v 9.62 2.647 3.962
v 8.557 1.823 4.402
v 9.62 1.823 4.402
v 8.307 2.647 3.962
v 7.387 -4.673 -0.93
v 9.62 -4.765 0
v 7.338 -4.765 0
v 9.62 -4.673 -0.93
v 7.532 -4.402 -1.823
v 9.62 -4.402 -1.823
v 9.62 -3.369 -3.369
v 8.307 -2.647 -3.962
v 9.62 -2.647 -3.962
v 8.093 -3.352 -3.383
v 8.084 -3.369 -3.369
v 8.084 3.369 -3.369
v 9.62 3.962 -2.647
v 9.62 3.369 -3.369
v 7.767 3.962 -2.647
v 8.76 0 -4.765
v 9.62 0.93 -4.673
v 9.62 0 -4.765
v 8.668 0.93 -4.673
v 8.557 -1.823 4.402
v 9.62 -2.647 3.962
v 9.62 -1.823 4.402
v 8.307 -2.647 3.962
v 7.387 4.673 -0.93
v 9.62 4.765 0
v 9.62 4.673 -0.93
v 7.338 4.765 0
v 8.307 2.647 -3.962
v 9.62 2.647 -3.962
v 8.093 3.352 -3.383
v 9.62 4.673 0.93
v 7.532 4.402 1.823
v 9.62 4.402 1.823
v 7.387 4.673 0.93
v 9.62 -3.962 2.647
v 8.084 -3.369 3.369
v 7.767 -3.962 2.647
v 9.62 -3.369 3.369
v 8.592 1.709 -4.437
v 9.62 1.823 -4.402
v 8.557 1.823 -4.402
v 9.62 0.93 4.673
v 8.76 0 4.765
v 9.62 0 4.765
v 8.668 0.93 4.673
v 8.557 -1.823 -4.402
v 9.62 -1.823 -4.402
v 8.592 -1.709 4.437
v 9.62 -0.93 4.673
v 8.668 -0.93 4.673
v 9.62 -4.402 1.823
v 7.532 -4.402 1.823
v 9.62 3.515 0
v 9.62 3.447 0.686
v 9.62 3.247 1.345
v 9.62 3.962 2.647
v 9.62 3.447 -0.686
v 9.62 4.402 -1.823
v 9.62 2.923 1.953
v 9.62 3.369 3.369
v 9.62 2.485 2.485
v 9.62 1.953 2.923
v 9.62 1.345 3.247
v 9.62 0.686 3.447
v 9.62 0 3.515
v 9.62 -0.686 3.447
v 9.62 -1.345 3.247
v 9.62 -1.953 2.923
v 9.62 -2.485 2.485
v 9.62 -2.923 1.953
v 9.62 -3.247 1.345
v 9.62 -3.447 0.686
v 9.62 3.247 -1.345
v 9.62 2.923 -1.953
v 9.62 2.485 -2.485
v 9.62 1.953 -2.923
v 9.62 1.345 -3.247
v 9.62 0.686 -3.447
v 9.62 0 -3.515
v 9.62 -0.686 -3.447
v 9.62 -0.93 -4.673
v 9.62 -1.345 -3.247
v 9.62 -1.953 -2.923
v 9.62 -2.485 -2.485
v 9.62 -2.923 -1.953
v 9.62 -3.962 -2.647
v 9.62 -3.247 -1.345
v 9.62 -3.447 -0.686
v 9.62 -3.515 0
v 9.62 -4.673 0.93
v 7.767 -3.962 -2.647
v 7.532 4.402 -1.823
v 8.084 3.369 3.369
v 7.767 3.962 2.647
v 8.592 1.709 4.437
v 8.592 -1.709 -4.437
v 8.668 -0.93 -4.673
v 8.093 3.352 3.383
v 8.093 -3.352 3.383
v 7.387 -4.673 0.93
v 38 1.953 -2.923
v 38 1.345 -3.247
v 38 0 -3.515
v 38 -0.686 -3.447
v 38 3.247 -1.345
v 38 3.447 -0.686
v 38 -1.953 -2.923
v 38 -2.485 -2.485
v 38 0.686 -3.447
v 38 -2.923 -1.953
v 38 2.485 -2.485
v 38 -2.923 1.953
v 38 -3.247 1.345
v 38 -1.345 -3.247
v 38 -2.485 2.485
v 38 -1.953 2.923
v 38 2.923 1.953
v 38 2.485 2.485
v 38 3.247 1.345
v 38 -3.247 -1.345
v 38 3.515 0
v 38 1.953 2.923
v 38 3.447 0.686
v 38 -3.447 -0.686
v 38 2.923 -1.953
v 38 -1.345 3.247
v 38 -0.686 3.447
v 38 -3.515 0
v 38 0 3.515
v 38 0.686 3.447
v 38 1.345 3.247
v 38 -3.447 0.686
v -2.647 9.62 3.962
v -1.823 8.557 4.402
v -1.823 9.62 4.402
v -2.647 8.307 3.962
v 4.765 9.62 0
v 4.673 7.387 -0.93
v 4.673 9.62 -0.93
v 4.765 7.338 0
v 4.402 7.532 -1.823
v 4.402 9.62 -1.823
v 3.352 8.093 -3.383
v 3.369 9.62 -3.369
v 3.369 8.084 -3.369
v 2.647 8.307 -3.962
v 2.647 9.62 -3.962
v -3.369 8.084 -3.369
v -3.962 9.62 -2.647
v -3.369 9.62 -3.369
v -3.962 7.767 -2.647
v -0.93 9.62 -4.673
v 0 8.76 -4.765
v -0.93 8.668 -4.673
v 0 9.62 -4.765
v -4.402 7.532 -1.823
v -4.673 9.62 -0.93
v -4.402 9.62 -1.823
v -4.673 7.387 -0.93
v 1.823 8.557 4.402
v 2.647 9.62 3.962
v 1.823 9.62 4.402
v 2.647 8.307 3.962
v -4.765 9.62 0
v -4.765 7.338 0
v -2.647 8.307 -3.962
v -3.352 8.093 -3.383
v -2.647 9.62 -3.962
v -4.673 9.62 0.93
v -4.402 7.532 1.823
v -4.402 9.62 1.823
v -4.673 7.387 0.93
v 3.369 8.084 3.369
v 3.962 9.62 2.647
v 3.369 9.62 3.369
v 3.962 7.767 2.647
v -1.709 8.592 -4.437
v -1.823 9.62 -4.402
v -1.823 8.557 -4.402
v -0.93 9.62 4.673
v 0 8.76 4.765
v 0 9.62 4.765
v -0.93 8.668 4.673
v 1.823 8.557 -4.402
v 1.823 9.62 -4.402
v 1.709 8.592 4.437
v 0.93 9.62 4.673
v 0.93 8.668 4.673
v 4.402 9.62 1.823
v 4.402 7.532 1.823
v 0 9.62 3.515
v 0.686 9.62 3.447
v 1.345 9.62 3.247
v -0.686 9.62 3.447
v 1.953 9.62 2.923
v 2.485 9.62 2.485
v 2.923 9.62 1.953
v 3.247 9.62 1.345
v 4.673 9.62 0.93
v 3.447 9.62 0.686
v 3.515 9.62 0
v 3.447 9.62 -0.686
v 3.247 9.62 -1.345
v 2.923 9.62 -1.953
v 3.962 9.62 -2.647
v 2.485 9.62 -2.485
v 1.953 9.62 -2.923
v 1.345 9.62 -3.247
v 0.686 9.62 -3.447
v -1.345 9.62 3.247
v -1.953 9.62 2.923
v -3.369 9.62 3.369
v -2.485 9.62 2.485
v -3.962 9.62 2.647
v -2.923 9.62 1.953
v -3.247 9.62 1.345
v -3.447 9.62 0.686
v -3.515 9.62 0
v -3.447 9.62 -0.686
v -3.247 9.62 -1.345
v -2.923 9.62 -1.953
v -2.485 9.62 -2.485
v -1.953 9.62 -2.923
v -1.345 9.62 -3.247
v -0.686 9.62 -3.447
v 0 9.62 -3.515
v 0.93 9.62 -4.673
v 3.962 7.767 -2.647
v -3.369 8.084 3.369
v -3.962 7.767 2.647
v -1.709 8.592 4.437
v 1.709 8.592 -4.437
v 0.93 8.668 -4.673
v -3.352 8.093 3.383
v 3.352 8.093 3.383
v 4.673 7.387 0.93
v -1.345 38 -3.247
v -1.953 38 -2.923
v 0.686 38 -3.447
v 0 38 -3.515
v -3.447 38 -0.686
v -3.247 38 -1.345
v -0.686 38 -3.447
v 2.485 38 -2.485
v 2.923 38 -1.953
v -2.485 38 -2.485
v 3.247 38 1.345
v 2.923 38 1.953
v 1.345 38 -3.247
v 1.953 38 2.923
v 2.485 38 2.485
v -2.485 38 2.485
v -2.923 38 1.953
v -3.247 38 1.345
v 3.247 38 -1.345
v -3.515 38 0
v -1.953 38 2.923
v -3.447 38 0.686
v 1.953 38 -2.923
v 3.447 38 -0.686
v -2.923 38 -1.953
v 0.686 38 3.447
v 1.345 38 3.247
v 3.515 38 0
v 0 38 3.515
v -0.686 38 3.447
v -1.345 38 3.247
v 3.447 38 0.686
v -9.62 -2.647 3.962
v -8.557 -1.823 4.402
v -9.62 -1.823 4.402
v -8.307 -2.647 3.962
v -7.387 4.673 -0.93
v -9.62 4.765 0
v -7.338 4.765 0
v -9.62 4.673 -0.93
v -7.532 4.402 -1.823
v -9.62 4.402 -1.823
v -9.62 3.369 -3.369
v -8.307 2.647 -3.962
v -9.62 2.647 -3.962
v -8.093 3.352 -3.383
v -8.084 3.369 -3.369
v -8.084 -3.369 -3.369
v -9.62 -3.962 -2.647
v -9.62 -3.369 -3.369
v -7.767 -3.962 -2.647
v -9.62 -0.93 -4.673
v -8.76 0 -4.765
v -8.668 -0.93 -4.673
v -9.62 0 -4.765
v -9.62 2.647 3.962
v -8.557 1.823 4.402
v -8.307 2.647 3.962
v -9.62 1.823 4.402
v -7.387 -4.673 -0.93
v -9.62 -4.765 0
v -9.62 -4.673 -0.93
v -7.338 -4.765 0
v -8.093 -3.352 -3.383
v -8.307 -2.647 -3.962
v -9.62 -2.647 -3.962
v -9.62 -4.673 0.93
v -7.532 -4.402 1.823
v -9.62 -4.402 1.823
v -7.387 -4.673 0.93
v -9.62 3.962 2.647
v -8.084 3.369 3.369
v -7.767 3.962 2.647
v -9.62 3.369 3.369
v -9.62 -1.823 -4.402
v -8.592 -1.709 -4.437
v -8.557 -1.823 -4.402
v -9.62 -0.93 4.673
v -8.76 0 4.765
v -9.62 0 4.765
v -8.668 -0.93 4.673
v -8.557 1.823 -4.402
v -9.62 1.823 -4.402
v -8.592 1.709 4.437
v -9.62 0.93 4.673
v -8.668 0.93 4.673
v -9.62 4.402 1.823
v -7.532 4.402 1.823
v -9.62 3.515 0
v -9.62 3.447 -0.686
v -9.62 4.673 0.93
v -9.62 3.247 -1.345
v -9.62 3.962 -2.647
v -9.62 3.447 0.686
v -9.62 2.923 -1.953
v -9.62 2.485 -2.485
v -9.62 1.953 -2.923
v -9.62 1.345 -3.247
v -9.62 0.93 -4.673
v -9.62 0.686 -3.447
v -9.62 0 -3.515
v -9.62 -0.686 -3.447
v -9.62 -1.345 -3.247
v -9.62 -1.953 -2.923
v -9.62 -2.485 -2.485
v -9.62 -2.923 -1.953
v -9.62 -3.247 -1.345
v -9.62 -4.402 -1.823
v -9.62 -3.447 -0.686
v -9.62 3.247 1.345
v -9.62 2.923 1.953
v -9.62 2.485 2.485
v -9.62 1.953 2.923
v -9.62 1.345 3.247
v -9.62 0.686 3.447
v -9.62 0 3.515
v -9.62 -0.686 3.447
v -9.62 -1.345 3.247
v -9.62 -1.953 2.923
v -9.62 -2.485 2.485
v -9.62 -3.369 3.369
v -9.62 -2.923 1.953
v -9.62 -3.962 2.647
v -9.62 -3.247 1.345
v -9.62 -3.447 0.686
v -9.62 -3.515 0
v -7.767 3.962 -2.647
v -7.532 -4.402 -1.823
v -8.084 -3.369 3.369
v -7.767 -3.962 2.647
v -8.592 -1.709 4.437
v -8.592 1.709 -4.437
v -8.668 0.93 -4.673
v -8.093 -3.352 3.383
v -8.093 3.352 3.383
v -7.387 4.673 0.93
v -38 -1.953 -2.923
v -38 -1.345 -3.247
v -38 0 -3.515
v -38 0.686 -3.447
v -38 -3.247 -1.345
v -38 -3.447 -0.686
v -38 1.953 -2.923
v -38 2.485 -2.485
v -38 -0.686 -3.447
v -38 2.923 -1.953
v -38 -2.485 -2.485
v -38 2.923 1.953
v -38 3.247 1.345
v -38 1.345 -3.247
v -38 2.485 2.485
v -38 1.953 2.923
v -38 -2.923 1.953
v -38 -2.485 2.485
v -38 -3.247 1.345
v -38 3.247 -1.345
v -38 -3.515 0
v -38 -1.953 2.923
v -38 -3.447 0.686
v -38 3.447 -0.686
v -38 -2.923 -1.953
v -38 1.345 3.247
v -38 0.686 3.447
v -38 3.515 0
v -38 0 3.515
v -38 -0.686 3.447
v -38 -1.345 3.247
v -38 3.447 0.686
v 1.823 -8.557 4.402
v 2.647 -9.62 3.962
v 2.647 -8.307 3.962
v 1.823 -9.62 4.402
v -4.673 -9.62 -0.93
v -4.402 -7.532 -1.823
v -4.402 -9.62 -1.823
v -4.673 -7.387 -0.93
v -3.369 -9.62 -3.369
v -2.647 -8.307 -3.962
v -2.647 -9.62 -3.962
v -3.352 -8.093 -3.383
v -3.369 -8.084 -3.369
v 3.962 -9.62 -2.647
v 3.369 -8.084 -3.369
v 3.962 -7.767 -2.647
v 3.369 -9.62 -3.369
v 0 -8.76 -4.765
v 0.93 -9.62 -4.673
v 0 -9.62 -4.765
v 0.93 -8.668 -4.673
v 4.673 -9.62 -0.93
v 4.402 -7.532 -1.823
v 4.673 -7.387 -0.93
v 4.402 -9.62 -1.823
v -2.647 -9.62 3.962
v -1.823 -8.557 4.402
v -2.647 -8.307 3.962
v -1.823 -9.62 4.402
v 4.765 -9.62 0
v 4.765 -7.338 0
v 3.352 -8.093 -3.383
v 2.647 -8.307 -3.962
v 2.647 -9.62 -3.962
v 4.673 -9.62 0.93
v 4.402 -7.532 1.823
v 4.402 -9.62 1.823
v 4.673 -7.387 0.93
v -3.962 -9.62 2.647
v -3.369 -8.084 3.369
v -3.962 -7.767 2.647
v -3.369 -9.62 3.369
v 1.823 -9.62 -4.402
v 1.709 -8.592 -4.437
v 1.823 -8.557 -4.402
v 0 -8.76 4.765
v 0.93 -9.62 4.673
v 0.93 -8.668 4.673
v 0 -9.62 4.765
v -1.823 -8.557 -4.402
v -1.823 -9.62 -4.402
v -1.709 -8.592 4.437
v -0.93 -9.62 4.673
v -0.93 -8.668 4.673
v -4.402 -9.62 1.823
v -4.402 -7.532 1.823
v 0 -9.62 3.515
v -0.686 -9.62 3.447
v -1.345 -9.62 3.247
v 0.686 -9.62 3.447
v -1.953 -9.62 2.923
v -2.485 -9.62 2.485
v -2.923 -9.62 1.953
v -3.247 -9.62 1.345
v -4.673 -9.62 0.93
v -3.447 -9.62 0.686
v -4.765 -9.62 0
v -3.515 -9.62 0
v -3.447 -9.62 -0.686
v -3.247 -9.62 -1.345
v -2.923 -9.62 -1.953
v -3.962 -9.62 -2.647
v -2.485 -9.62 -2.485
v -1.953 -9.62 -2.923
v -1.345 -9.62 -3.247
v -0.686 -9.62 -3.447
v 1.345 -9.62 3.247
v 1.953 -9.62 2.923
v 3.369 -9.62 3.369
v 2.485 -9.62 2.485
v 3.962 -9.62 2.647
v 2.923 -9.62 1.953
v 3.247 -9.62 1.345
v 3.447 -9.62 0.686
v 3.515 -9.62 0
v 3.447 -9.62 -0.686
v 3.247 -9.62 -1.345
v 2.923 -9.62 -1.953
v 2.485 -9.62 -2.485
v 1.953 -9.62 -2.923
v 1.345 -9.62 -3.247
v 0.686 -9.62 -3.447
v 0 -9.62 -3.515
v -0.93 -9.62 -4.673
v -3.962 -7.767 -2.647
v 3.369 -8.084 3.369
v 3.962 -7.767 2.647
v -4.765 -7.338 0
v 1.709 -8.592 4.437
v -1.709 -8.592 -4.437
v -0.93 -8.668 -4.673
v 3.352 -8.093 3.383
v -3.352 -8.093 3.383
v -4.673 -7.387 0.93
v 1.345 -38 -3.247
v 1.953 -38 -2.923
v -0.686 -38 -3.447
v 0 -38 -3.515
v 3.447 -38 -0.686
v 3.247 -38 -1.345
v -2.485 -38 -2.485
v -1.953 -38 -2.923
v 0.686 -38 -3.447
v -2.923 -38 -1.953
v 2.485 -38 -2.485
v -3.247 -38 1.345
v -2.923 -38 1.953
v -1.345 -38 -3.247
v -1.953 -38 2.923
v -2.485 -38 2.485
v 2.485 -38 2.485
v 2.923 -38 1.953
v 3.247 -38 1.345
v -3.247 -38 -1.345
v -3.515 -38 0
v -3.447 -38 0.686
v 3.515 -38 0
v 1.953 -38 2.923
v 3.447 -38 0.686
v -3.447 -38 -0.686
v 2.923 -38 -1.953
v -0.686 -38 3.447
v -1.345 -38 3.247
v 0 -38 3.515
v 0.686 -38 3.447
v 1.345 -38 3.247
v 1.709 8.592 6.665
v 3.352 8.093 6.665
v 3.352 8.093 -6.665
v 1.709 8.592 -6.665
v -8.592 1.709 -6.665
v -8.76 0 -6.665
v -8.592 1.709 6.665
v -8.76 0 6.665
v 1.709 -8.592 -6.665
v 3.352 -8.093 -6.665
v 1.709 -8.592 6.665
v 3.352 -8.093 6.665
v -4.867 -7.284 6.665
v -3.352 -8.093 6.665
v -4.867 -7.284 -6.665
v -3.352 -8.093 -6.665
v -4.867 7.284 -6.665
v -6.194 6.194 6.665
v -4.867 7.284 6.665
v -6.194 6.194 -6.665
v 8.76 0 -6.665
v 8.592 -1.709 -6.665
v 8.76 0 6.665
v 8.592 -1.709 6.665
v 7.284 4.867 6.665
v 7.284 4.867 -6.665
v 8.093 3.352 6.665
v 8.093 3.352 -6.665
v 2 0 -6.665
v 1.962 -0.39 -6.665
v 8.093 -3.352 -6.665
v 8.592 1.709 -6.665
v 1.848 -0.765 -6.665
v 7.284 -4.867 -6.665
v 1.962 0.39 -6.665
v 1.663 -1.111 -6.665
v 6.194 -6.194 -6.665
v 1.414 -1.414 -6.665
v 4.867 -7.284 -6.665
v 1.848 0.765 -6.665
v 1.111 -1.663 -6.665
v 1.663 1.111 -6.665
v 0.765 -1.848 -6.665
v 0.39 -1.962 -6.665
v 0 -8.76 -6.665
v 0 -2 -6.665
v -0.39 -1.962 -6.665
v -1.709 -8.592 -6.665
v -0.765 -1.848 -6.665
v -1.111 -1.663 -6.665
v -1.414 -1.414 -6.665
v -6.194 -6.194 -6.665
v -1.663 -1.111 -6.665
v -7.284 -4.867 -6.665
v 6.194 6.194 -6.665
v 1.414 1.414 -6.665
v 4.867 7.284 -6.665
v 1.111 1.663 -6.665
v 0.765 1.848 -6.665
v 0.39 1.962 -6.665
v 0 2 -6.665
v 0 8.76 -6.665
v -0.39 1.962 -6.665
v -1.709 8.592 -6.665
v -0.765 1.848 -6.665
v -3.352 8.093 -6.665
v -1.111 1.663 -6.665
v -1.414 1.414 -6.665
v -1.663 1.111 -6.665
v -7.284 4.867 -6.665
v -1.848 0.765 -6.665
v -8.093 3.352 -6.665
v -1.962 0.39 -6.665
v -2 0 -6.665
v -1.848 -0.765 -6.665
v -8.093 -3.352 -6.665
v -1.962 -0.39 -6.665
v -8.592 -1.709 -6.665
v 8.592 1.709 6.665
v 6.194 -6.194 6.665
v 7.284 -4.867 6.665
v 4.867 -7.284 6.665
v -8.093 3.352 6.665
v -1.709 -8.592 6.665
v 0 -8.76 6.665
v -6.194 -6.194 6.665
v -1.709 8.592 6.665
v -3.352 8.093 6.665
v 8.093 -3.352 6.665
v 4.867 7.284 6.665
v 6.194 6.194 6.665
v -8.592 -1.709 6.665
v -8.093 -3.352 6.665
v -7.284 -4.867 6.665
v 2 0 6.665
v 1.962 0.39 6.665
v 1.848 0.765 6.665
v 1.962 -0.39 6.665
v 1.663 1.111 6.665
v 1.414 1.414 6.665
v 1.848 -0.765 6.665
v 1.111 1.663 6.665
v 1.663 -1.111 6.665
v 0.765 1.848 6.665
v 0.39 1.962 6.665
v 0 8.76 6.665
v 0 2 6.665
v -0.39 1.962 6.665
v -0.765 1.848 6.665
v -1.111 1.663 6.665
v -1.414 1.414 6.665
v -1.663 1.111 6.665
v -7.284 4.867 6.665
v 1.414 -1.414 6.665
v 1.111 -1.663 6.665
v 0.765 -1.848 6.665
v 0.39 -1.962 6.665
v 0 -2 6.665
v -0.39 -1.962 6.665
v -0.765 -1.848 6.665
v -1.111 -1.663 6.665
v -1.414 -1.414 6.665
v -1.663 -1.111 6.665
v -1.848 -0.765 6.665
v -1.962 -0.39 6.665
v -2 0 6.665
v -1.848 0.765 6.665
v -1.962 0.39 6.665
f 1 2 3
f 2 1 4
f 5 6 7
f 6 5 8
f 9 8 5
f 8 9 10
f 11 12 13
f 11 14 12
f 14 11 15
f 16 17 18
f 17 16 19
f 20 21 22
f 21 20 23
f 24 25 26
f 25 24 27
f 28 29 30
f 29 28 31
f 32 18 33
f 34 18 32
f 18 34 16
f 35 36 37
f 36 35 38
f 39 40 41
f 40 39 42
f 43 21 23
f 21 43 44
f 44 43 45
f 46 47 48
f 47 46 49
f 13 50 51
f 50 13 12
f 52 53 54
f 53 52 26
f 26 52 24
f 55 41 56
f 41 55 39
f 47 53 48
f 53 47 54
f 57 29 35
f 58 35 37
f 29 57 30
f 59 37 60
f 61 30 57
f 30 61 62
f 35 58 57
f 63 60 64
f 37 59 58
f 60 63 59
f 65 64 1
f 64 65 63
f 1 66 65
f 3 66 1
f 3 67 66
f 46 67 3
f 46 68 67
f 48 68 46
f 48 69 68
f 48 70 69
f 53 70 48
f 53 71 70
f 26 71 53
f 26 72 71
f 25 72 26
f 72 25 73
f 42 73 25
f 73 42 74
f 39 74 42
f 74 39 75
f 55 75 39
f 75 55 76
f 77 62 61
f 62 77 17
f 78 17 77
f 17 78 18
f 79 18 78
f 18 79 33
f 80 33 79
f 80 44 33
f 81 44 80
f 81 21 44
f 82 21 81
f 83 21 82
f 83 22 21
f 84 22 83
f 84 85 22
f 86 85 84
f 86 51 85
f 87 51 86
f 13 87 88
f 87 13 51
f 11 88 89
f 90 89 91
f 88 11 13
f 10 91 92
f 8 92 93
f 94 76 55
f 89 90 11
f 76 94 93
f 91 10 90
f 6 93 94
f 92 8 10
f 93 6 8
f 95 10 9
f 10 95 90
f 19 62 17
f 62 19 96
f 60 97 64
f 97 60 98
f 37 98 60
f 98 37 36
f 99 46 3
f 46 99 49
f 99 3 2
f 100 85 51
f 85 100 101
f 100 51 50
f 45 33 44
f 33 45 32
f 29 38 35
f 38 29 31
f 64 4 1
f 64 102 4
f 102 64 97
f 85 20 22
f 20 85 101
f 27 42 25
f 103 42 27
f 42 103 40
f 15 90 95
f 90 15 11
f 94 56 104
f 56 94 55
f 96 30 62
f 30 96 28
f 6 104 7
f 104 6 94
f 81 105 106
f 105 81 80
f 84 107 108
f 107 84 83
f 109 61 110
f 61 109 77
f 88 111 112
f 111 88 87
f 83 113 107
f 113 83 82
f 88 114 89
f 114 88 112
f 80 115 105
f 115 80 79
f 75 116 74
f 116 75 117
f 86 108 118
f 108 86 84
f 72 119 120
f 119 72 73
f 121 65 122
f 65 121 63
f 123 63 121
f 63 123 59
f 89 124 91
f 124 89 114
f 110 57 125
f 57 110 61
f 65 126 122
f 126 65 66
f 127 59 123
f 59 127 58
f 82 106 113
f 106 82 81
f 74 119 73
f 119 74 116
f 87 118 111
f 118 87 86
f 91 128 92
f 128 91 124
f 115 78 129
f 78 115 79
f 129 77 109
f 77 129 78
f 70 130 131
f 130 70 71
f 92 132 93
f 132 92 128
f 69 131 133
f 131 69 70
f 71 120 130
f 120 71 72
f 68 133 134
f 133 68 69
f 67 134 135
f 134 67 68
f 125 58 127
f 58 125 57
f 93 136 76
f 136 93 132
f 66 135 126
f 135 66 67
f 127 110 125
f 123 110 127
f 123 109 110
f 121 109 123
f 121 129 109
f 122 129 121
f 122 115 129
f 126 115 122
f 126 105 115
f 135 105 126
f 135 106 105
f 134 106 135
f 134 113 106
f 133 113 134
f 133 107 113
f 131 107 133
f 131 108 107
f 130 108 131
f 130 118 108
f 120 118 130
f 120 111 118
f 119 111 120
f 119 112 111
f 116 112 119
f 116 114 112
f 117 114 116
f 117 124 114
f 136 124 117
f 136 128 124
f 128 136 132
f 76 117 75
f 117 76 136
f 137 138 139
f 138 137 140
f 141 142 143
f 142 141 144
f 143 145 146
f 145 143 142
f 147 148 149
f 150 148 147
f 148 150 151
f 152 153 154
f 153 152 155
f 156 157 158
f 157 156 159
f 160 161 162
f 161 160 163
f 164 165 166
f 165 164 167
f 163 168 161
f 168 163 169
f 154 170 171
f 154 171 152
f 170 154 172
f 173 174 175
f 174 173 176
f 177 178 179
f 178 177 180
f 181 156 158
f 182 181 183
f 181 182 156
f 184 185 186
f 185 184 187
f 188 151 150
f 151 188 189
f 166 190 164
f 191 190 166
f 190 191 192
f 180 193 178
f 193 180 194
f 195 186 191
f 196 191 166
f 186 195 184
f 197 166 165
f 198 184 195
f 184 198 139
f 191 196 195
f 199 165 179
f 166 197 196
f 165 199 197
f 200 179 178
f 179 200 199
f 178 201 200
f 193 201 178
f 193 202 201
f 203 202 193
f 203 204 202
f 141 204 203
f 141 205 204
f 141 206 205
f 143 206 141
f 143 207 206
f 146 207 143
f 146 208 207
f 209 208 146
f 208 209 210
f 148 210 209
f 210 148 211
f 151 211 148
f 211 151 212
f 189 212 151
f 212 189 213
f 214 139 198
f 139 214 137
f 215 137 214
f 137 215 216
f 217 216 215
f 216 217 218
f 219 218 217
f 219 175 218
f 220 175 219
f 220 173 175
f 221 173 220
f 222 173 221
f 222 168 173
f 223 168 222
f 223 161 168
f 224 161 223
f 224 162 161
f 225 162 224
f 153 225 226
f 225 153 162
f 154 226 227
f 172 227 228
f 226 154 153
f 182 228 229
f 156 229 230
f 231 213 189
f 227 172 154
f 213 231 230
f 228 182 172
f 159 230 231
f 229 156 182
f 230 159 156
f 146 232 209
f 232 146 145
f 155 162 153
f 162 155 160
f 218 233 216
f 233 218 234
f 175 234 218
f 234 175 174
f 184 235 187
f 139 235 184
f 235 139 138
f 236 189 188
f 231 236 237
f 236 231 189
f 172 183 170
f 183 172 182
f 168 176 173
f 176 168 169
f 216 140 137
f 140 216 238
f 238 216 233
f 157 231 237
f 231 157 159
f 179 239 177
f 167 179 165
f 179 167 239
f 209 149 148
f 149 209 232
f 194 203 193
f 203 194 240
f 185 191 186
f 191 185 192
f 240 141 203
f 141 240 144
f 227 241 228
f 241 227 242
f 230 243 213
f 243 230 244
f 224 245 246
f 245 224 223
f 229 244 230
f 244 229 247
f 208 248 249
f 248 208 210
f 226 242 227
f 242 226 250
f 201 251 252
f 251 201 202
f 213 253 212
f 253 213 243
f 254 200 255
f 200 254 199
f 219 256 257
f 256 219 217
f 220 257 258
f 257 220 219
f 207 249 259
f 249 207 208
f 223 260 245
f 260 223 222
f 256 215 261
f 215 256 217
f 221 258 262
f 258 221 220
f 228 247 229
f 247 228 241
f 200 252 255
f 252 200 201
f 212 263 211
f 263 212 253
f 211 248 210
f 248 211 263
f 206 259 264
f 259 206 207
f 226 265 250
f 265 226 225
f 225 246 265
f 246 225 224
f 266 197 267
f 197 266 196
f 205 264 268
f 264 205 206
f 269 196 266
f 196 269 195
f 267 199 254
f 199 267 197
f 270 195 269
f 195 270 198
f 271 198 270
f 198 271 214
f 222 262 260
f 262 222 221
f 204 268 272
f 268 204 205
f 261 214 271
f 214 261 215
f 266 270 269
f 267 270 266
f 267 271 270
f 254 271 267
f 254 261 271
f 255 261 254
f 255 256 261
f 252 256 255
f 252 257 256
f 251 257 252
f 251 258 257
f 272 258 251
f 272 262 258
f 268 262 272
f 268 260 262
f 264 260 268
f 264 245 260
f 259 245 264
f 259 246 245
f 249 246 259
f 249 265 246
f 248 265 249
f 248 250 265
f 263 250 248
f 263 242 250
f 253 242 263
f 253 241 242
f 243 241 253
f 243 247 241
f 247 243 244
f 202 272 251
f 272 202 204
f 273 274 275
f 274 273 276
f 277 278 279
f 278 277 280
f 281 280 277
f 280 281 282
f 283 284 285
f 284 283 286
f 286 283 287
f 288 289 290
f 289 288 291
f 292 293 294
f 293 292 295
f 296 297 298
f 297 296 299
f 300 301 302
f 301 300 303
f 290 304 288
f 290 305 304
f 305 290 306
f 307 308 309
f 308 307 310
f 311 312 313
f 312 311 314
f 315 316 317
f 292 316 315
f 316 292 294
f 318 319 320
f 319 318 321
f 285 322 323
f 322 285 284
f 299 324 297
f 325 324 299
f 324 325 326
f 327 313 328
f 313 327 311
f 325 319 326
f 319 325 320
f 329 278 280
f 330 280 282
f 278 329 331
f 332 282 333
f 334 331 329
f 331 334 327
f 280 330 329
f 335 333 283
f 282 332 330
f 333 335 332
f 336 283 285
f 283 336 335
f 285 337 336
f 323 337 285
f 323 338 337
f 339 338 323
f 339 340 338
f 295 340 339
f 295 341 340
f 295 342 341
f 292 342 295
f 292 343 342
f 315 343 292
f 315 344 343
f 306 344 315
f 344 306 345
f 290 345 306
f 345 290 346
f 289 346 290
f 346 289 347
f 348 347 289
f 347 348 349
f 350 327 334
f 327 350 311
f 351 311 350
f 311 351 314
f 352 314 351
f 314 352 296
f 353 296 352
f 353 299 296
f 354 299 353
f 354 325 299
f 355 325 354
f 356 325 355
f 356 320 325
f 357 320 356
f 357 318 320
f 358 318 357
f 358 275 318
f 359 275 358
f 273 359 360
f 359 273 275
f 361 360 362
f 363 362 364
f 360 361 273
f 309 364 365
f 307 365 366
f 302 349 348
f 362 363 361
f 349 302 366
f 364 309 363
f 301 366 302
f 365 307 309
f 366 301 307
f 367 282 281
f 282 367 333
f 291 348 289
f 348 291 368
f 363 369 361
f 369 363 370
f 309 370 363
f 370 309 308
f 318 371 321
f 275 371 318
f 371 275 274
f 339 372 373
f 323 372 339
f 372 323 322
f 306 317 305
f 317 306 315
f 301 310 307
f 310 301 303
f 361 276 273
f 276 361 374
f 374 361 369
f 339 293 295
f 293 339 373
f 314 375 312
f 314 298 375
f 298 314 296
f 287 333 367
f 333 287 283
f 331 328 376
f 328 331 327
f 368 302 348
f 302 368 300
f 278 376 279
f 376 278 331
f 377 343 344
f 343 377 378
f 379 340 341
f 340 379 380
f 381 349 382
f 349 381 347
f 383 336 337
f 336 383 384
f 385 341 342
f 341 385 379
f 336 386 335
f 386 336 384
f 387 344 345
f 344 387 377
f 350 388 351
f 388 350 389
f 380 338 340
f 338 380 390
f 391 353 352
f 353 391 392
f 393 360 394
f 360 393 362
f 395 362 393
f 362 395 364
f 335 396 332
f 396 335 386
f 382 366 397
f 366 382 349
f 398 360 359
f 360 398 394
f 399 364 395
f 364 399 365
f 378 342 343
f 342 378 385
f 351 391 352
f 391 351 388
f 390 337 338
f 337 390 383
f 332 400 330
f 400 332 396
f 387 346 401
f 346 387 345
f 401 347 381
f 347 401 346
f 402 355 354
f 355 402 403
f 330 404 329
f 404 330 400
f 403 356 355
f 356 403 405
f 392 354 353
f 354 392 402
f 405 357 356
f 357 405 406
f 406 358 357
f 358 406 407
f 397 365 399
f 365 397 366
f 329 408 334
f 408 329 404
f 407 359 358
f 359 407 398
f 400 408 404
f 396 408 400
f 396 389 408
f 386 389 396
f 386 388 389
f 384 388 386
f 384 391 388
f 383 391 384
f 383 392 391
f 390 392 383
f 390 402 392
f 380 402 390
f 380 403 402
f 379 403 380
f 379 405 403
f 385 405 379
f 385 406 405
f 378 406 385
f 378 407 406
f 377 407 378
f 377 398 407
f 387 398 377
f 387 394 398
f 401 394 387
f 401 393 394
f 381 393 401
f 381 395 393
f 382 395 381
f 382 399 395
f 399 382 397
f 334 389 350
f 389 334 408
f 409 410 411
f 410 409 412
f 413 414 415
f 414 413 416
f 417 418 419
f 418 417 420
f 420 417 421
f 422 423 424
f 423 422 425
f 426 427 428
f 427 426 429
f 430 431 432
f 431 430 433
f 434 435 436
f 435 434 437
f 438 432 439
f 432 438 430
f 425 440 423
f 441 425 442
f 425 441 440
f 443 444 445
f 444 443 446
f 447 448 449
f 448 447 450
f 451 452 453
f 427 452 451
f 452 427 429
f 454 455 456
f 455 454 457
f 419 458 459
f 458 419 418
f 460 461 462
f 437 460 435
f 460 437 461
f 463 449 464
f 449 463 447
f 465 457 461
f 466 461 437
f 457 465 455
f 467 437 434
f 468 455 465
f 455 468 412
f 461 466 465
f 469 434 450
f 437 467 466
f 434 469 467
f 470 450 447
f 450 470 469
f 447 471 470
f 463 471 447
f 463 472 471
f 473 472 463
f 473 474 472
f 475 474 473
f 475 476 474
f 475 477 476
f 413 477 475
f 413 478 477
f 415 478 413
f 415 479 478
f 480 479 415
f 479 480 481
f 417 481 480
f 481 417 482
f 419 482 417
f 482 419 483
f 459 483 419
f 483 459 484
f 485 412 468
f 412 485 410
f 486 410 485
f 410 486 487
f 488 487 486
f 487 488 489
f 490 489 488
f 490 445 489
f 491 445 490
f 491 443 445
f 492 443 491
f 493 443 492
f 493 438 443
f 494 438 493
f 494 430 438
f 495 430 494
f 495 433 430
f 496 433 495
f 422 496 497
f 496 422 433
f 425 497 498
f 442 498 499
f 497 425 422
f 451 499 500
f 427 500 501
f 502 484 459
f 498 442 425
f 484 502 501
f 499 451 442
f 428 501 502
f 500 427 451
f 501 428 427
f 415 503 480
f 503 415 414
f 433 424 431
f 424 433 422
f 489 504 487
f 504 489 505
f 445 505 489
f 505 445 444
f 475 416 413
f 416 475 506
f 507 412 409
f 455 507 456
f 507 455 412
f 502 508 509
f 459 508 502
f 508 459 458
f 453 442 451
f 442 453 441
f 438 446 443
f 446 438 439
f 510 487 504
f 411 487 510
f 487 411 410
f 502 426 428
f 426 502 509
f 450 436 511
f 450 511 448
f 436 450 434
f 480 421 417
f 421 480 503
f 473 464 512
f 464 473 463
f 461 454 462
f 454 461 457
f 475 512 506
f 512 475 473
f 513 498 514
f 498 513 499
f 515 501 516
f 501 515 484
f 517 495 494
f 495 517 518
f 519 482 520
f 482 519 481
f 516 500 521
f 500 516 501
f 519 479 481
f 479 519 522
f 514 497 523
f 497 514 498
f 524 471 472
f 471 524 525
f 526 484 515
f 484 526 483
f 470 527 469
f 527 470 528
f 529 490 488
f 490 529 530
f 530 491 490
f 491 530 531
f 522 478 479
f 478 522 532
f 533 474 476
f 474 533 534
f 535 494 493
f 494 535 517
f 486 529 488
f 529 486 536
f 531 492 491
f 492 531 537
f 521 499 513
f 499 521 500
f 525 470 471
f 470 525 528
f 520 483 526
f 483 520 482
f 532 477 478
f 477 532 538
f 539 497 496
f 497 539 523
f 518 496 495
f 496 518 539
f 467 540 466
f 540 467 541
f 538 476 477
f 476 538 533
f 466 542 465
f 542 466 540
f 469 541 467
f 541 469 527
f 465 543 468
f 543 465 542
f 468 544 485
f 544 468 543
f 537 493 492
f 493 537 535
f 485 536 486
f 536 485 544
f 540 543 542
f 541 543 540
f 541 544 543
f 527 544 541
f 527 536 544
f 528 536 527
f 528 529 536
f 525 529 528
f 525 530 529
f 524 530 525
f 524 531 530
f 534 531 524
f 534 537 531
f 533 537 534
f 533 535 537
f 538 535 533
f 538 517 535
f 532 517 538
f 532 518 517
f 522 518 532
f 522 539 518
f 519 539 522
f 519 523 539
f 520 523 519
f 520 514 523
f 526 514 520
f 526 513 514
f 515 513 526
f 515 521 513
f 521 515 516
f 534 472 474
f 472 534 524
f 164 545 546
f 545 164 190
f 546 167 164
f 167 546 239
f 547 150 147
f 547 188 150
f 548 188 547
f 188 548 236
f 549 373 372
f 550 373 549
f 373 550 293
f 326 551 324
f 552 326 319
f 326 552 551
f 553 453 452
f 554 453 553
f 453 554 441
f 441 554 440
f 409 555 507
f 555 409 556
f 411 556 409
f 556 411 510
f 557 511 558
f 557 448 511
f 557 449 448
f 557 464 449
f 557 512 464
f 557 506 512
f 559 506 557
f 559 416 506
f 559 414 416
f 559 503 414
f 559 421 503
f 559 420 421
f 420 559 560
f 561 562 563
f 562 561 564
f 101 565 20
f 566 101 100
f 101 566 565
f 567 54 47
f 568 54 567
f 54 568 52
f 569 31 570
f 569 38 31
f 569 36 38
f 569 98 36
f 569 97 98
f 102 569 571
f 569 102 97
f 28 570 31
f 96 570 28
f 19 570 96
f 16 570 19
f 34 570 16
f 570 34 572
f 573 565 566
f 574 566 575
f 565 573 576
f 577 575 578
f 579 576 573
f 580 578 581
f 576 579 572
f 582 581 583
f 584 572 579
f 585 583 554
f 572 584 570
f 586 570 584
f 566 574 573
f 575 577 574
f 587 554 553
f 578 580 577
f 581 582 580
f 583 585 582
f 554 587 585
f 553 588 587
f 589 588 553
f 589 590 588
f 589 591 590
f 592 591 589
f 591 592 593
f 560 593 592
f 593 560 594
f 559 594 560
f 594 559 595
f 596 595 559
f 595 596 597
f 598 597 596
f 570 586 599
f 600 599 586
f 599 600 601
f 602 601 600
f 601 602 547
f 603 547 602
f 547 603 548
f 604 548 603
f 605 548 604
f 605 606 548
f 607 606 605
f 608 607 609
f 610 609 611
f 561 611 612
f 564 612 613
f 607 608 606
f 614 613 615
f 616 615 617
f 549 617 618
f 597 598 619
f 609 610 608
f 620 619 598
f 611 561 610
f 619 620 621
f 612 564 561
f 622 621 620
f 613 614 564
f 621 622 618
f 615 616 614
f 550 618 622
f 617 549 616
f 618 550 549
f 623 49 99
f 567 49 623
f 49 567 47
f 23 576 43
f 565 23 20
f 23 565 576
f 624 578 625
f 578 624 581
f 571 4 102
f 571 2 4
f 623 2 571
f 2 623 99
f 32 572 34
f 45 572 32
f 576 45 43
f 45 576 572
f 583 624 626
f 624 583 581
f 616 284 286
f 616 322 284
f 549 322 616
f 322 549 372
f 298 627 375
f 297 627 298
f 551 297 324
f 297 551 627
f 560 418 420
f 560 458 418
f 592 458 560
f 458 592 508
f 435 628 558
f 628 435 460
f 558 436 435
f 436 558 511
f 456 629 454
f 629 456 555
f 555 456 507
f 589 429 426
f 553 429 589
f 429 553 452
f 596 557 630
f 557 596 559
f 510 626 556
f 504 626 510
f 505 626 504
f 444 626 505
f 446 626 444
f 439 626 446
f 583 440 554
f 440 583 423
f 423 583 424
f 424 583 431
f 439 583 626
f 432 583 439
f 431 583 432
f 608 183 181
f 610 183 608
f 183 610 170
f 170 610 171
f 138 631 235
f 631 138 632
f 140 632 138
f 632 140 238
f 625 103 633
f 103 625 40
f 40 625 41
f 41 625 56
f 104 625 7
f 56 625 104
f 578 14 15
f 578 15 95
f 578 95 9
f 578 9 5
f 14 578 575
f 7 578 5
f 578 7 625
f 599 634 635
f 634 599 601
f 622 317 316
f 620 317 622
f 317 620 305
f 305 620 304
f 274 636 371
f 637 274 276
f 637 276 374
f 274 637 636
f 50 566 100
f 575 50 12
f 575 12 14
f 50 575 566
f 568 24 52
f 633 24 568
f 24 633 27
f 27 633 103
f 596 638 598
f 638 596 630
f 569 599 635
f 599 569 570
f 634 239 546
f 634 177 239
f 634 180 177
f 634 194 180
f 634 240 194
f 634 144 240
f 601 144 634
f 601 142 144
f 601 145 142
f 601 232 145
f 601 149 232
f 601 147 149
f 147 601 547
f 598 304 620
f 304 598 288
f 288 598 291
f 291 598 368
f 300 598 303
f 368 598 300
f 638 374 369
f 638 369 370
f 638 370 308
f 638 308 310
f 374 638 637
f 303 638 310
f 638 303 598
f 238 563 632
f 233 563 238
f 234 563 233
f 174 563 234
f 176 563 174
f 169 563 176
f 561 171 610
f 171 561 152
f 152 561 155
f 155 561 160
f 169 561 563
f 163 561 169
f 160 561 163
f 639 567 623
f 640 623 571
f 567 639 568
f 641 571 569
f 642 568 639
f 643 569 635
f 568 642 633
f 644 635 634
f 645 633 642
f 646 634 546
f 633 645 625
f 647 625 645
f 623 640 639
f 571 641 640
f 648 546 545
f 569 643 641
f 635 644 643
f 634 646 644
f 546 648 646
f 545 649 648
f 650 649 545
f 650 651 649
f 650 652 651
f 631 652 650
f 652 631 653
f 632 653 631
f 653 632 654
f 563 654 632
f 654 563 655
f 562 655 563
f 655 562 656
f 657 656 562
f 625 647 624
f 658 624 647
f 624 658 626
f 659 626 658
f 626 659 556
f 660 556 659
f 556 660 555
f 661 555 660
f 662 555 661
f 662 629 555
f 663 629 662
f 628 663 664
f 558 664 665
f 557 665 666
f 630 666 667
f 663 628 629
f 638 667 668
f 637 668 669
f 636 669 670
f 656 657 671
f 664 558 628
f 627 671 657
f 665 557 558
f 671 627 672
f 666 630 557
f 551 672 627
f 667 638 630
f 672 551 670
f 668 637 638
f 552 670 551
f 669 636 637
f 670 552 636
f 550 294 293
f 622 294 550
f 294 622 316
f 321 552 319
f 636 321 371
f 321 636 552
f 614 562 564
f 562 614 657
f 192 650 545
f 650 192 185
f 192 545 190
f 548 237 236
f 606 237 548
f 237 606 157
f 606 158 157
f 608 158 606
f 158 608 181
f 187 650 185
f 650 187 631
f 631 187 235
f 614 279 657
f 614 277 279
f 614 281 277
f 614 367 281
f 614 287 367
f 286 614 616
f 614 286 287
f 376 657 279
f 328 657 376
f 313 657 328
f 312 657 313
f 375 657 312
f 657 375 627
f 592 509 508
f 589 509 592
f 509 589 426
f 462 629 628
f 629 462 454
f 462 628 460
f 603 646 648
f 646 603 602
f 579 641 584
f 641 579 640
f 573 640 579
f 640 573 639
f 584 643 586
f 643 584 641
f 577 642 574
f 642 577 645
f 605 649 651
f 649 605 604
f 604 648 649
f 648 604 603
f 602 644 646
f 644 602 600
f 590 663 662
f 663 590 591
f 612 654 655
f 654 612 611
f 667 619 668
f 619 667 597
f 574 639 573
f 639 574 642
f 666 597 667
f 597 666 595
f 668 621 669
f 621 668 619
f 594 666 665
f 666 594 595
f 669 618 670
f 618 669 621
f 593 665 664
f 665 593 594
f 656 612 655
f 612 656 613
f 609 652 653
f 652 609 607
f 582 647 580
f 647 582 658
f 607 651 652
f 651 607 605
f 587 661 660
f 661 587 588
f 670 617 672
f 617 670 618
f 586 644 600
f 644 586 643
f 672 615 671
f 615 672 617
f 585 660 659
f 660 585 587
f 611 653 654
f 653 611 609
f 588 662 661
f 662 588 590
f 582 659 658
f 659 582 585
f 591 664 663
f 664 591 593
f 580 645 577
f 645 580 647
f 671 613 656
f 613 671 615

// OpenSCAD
$fn = 32;

// ----------------------------------------------------------------------
// Cardan cross: 76 mm span, 9.53 mm trunnions
// ----------------------------------------------------------------------

// --- parameters (mm) ---
journal_d = 9.53;         // trunnion diameter
arm_len = 38;             // trunnion length from the centre
step_r = 3.24;            // step position from the centre
step_d = 7.03;            // journal diameter after the step
hub_d = 17.52;            // hub diameter
hub_h = 13.33;            // hub height
bore_d = 4;               // hub bore

difference() {
  union() {
    /* hub along the joint axis */
    cylinder(h = hub_h, d = hub_d, center = true);
    for (a = [0 : 90 : 270]) rotate([0, 0, a]) {
      /* trunnion, sunk into the hub */
      translate([hub_d / 4, 0, 0]) rotate([0, 90, 0]) cylinder(h = step_r + 2, d = journal_d);
      /* stepped journal out to the tip */
      translate([step_r - 0.5, 0, 0]) rotate([0, 90, 0]) cylinder(h = arm_len + 0.5 - step_r, d = step_d);
    }
  }
  /* lubrication bore through the hub, 2.5 mm clear on both sides */
  translate([0, 0, -hub_h / 2 - 2.5]) cylinder(h = hub_h + 5, d = bore_d);
}
